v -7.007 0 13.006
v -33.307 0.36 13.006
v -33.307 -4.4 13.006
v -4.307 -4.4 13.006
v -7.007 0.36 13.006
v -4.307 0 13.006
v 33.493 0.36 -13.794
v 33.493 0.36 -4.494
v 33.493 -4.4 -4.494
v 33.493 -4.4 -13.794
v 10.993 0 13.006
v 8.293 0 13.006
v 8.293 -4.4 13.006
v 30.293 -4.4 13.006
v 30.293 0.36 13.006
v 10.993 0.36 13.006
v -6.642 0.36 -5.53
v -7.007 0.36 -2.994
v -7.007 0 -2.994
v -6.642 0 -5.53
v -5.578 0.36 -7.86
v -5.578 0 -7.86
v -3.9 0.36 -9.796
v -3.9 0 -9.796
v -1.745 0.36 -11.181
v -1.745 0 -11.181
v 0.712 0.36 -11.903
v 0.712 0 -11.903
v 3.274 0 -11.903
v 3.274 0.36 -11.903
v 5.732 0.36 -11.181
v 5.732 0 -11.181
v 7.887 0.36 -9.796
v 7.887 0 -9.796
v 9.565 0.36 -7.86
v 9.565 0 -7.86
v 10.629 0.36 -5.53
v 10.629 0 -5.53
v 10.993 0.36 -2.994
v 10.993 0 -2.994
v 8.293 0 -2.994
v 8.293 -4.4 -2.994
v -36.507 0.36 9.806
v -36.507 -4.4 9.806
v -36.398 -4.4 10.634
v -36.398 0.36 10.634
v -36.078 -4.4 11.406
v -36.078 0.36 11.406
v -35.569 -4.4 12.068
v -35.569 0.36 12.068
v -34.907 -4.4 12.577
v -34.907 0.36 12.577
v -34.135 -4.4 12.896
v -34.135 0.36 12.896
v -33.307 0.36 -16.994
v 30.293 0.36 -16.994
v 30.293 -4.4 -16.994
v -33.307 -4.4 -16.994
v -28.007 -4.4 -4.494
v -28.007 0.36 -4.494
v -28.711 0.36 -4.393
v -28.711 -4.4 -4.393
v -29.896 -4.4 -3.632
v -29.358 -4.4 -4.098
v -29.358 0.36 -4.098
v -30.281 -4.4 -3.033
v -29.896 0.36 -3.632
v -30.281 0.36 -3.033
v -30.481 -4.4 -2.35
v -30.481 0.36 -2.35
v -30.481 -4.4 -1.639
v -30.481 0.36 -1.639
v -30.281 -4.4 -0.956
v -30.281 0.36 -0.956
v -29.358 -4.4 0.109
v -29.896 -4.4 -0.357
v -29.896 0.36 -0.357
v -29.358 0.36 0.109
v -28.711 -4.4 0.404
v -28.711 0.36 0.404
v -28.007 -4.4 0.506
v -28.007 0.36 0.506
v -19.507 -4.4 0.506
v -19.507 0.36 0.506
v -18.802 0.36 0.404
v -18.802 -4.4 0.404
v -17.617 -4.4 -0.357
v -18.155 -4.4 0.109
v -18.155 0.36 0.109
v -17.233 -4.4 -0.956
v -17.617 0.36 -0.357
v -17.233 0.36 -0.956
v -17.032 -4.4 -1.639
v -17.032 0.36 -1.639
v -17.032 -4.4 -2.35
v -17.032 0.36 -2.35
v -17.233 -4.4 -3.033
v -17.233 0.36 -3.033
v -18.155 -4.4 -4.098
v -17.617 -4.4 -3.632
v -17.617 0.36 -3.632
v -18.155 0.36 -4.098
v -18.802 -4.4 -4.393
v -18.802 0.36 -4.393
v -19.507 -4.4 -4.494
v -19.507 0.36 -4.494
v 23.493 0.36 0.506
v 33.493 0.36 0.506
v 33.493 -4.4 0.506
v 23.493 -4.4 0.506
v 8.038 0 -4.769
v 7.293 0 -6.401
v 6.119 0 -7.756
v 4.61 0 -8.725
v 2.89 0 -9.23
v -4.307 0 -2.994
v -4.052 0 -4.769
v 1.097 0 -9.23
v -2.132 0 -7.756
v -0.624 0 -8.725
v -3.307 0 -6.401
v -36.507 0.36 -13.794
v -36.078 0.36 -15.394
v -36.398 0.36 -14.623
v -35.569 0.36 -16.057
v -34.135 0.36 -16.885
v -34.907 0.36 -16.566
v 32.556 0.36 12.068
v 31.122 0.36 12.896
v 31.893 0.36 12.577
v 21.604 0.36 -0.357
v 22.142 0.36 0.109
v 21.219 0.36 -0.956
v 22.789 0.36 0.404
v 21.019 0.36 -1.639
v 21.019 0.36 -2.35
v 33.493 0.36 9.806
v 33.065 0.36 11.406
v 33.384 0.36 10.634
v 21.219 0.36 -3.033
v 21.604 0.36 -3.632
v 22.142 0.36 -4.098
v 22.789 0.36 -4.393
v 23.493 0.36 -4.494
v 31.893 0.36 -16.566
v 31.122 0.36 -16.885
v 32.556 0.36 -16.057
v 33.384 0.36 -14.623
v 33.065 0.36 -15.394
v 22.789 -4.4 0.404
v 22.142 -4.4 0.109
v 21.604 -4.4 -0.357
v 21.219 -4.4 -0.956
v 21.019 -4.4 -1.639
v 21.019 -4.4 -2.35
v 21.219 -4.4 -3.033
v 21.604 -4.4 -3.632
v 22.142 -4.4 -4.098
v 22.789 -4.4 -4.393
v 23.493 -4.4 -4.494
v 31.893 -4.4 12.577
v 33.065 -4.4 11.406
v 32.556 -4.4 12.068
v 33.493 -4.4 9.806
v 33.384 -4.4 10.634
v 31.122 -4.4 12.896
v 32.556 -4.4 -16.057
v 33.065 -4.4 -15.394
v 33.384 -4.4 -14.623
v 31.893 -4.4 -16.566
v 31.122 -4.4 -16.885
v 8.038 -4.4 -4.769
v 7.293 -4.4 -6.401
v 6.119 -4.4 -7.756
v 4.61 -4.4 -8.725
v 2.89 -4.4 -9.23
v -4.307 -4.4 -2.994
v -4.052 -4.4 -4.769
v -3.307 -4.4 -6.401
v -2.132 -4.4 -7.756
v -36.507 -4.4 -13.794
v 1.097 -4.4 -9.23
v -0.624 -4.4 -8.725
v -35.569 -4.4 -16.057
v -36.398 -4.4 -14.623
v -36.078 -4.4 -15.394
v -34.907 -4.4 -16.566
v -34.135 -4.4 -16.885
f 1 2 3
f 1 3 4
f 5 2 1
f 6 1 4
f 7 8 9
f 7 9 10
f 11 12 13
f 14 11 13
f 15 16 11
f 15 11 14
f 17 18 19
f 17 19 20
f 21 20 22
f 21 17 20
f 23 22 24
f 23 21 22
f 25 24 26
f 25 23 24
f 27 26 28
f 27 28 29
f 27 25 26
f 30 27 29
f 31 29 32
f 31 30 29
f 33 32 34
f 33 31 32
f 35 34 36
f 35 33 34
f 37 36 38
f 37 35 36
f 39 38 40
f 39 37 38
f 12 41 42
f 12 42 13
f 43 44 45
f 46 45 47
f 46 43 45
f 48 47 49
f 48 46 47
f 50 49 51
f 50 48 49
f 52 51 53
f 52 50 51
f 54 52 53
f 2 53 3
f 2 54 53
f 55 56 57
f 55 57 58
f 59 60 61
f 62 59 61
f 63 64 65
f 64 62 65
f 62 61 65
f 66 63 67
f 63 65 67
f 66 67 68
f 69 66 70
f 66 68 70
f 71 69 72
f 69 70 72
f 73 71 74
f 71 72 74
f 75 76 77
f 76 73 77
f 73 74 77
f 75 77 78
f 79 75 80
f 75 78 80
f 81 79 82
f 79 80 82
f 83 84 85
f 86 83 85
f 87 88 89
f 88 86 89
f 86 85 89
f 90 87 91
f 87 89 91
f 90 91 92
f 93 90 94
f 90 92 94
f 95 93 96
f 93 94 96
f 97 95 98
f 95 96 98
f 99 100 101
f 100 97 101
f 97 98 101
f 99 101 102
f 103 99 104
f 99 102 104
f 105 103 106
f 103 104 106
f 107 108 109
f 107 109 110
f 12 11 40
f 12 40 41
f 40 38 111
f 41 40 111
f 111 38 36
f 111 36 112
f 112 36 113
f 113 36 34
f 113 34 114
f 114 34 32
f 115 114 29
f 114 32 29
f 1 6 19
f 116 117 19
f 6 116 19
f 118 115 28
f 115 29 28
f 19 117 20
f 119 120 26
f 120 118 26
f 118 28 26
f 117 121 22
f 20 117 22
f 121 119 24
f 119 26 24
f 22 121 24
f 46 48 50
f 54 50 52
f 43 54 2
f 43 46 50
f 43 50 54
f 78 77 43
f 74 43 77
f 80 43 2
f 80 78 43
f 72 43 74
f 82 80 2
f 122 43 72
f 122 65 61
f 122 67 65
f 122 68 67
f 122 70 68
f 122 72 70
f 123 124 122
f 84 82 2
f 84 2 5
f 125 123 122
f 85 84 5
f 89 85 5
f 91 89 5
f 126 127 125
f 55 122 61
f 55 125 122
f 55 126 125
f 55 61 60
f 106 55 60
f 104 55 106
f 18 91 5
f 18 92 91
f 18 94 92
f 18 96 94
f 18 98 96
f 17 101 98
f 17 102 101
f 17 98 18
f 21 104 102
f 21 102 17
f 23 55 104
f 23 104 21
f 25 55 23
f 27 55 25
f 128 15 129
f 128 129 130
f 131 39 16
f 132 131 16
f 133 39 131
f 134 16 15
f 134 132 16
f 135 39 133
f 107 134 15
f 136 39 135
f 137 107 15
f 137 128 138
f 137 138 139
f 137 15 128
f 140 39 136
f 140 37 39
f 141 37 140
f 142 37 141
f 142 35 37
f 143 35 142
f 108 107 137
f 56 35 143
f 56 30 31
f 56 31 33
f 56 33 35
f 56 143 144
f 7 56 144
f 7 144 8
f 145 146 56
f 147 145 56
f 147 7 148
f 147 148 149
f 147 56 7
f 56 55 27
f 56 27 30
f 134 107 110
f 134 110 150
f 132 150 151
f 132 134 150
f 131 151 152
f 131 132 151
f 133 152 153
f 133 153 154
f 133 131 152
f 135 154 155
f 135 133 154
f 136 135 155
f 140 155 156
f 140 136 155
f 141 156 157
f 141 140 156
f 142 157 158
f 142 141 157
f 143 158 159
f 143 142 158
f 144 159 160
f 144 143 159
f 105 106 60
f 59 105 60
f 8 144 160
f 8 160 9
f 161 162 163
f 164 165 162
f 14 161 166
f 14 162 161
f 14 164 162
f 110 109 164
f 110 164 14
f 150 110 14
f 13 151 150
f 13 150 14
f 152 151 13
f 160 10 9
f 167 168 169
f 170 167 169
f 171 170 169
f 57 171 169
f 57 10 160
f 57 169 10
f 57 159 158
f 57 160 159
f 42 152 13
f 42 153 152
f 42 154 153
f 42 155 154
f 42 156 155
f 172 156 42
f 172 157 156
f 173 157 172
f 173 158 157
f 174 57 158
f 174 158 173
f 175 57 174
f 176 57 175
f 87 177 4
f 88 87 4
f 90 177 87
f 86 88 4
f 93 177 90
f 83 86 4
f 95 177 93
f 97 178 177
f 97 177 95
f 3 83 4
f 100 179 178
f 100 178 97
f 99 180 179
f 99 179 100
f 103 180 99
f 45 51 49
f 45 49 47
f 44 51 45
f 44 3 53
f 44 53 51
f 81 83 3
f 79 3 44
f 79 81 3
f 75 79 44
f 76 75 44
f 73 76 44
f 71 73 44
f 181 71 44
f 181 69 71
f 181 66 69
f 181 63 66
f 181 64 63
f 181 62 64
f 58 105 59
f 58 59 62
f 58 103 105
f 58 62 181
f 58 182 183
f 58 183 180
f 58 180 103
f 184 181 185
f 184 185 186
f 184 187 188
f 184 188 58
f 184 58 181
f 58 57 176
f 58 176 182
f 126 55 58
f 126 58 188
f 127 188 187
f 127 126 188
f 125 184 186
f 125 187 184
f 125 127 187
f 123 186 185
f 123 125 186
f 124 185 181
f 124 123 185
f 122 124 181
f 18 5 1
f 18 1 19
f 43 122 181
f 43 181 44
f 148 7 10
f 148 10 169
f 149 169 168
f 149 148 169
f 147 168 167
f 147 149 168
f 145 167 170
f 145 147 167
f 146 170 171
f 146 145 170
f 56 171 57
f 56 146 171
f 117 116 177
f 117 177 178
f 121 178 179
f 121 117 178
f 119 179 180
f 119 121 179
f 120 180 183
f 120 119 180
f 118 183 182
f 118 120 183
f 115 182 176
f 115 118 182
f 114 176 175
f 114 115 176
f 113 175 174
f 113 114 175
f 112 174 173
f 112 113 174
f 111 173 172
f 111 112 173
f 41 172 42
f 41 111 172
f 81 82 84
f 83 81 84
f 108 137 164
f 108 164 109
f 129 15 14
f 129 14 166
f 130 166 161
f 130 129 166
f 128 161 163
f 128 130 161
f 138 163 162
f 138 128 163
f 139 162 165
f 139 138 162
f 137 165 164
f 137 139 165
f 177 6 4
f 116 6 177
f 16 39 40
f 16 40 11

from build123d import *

# Parameters (mm, degrees)
BASE_FLANGE1_DEPTH      = 4.4
CUT_EXTRUDE1_DEPTH      = 10.36
CUT_EXTRUDE1_DEPTH_BACK = 4.76
CUT_EXTRUDE2_DEPTH      = 4.76
BOSS_EXTRUDE1_START     = 0.36
BOSS_EXTRUDE1_DEPTH     = 0.36


# Sheet-metal steps are written as plain solids
with BuildPart() as part:
    # Sketch2 → Base-Flange1 (new body)
    with BuildSketch(Plane(origin=(0, 0, 0), x_dir=(1, 0, 0), z_dir=(0, 1, 0))):
        with BuildLine():
            Line((-33.306696524, 16.994496658), (30.293303476, 16.994496658))
            ThreePointArc((30.293303476, 16.994496658), (32.556045176, 16.057238357), (33.493303476, 13.794496658))
            Line((33.493303476, 13.794496658), (33.493303476, -9.805503342))
            ThreePointArc((33.493303476, -9.805503342), (32.556045176, -12.068245042), (30.293303476, -13.005503342))
            Line((30.293303476, -13.005503342), (-33.306696524, -13.005503342))
            ThreePointArc((-33.306696524, -13.005503342), (-35.569438223, -12.068245042), (-36.506696524, -9.805503342))
            Line((-36.506696524, -9.805503342), (-36.506696524, 13.794496658))
            ThreePointArc((-36.506696524, 13.794496658), (-35.569438223, 16.057238357), (-33.306696524, 16.994496658))
        make_face()
    extrude(amount=-BASE_FLANGE1_DEPTH)

    # Sketch7 → Cut-Extrude1 (cut, two sides: drawn at the far end of the back side and taken through both)
    with BuildSketch(Plane(origin=(0, 0, 0), x_dir=(1, 0, 0), z_dir=(0, 1, 0)).offset(-CUT_EXTRUDE1_DEPTH_BACK)):
        with BuildLine():
            Line((-28.006696524, 4.494496658), (-19.506696524, 4.494496658))
            ThreePointArc((-19.506696524, 4.494496658), (-17.006696524, 1.994496658), (-19.506696524, -0.505503342))
            Line((-19.506696524, -0.505503342), (-28.006696524, -0.505503342))
            ThreePointArc((-28.006696524, -0.505503342), (-30.506696524, 1.994496658), (-28.006696524, 4.494496658))
        make_face()
        with BuildLine():
            Line((23.493303476, 4.494496658), (33.493303476, 4.494496658))
            ThreePointArc((33.493303476, 4.494496658), (35.993303476, 1.994496658), (33.493303476, -0.505503342))
            Line((33.493303476, -0.505503342), (23.493303476, -0.505503342))
            ThreePointArc((23.493303476, -0.505503342), (20.993303476, 1.994496658), (23.493303476, 4.494496658))
        make_face()
    extrude(amount=CUT_EXTRUDE1_DEPTH + CUT_EXTRUDE1_DEPTH_BACK, mode=Mode.SUBTRACT)

    # Sketch8 → Cut-Extrude2 (cut)
    with BuildSketch(Plane(origin=(0, 0, 0), x_dir=(1, 0, 0), z_dir=(0, 1, 0))):
        with BuildLine():
            Line((8.293303476, 2.994496658), (8.293303476, -13.005503342))
            ThreePointArc((8.293303476, -13.005503342), (1.993303476, -19.305503342), (-4.306696524, -13.005503342))
            Line((-4.306696524, -13.005503342), (-4.306696524, 2.994496658))
            ThreePointArc((-4.306696524, 2.994496658), (1.993303476, 9.294496658), (8.293303476, 2.994496658))
        make_face()
    extrude(amount=-CUT_EXTRUDE2_DEPTH, mode=Mode.SUBTRACT)

    # Sketch11 → Boss-Extrude1 (add)
    with BuildSketch(Plane(origin=(0, 0, 0), x_dir=(1, 0, 0), z_dir=(0, 1, 0)).offset(BOSS_EXTRUDE1_START)):
        with BuildLine():
            Line((-36.506696524, 13.794496658), (-36.506696524, -9.805503342))
            ThreePointArc((-36.506696524, -9.805503342), (-35.569438223, -12.068245042), (-33.306696524, -13.005503342))
            Line((-33.306696524, -13.005503342), (-7.006696524, -13.005503342))
            Line((-7.006696524, -13.005503342), (-7.006696524, 2.994496658))
            ThreePointArc((-7.006696524, 2.994496658), (1.993303476, 11.994496658), (10.993303476, 2.994496658))
            Line((10.993303476, 2.994496658), (10.993303476, -13.005503342))
            Line((10.993303476, -13.005503342), (30.293303476, -13.005503342))
            ThreePointArc((30.293303476, -13.005503342), (32.556045176, -12.068245042), (33.493303476, -9.805503342))
            Line((33.493303476, -9.805503342), (33.493303476, -0.505503342))
            Line((33.493303476, -0.505503342), (23.493303476, -0.505503342))
            ThreePointArc((23.493303476, -0.505503342), (20.993303476, 1.994496658), (23.493303476, 4.494496658))
            Line((23.493303476, 4.494496658), (33.493303476, 4.494496658))
            Line((33.493303476, 4.494496658), (33.493303476, 13.794496658))
            ThreePointArc((33.493303476, 13.794496658), (32.556045176, 16.057238357), (30.293303476, 16.994496658))
            Line((30.293303476, 16.994496658), (-33.306696524, 16.994496658))
            ThreePointArc((-33.306696524, 16.994496658), (-35.569438223, 16.057238357), (-36.506696524, 13.794496658))
        make_face()
        with BuildLine():
            Line((-19.506696524, 4.494496658), (-28.006696524, 4.494496658))
            ThreePointArc((-28.006696524, 4.494496658), (-30.506696524, 1.994496658), (-28.006696524, -0.505503342))
            Line((-28.006696524, -0.505503342), (-19.506696524, -0.505503342))
            ThreePointArc((-19.506696524, -0.505503342), (-17.006696524, 1.994496658), (-19.506696524, 4.494496658))
        make_face(mode=Mode.SUBTRACT)
    extrude(amount=-BOSS_EXTRUDE1_DEPTH)


solid = part.part
